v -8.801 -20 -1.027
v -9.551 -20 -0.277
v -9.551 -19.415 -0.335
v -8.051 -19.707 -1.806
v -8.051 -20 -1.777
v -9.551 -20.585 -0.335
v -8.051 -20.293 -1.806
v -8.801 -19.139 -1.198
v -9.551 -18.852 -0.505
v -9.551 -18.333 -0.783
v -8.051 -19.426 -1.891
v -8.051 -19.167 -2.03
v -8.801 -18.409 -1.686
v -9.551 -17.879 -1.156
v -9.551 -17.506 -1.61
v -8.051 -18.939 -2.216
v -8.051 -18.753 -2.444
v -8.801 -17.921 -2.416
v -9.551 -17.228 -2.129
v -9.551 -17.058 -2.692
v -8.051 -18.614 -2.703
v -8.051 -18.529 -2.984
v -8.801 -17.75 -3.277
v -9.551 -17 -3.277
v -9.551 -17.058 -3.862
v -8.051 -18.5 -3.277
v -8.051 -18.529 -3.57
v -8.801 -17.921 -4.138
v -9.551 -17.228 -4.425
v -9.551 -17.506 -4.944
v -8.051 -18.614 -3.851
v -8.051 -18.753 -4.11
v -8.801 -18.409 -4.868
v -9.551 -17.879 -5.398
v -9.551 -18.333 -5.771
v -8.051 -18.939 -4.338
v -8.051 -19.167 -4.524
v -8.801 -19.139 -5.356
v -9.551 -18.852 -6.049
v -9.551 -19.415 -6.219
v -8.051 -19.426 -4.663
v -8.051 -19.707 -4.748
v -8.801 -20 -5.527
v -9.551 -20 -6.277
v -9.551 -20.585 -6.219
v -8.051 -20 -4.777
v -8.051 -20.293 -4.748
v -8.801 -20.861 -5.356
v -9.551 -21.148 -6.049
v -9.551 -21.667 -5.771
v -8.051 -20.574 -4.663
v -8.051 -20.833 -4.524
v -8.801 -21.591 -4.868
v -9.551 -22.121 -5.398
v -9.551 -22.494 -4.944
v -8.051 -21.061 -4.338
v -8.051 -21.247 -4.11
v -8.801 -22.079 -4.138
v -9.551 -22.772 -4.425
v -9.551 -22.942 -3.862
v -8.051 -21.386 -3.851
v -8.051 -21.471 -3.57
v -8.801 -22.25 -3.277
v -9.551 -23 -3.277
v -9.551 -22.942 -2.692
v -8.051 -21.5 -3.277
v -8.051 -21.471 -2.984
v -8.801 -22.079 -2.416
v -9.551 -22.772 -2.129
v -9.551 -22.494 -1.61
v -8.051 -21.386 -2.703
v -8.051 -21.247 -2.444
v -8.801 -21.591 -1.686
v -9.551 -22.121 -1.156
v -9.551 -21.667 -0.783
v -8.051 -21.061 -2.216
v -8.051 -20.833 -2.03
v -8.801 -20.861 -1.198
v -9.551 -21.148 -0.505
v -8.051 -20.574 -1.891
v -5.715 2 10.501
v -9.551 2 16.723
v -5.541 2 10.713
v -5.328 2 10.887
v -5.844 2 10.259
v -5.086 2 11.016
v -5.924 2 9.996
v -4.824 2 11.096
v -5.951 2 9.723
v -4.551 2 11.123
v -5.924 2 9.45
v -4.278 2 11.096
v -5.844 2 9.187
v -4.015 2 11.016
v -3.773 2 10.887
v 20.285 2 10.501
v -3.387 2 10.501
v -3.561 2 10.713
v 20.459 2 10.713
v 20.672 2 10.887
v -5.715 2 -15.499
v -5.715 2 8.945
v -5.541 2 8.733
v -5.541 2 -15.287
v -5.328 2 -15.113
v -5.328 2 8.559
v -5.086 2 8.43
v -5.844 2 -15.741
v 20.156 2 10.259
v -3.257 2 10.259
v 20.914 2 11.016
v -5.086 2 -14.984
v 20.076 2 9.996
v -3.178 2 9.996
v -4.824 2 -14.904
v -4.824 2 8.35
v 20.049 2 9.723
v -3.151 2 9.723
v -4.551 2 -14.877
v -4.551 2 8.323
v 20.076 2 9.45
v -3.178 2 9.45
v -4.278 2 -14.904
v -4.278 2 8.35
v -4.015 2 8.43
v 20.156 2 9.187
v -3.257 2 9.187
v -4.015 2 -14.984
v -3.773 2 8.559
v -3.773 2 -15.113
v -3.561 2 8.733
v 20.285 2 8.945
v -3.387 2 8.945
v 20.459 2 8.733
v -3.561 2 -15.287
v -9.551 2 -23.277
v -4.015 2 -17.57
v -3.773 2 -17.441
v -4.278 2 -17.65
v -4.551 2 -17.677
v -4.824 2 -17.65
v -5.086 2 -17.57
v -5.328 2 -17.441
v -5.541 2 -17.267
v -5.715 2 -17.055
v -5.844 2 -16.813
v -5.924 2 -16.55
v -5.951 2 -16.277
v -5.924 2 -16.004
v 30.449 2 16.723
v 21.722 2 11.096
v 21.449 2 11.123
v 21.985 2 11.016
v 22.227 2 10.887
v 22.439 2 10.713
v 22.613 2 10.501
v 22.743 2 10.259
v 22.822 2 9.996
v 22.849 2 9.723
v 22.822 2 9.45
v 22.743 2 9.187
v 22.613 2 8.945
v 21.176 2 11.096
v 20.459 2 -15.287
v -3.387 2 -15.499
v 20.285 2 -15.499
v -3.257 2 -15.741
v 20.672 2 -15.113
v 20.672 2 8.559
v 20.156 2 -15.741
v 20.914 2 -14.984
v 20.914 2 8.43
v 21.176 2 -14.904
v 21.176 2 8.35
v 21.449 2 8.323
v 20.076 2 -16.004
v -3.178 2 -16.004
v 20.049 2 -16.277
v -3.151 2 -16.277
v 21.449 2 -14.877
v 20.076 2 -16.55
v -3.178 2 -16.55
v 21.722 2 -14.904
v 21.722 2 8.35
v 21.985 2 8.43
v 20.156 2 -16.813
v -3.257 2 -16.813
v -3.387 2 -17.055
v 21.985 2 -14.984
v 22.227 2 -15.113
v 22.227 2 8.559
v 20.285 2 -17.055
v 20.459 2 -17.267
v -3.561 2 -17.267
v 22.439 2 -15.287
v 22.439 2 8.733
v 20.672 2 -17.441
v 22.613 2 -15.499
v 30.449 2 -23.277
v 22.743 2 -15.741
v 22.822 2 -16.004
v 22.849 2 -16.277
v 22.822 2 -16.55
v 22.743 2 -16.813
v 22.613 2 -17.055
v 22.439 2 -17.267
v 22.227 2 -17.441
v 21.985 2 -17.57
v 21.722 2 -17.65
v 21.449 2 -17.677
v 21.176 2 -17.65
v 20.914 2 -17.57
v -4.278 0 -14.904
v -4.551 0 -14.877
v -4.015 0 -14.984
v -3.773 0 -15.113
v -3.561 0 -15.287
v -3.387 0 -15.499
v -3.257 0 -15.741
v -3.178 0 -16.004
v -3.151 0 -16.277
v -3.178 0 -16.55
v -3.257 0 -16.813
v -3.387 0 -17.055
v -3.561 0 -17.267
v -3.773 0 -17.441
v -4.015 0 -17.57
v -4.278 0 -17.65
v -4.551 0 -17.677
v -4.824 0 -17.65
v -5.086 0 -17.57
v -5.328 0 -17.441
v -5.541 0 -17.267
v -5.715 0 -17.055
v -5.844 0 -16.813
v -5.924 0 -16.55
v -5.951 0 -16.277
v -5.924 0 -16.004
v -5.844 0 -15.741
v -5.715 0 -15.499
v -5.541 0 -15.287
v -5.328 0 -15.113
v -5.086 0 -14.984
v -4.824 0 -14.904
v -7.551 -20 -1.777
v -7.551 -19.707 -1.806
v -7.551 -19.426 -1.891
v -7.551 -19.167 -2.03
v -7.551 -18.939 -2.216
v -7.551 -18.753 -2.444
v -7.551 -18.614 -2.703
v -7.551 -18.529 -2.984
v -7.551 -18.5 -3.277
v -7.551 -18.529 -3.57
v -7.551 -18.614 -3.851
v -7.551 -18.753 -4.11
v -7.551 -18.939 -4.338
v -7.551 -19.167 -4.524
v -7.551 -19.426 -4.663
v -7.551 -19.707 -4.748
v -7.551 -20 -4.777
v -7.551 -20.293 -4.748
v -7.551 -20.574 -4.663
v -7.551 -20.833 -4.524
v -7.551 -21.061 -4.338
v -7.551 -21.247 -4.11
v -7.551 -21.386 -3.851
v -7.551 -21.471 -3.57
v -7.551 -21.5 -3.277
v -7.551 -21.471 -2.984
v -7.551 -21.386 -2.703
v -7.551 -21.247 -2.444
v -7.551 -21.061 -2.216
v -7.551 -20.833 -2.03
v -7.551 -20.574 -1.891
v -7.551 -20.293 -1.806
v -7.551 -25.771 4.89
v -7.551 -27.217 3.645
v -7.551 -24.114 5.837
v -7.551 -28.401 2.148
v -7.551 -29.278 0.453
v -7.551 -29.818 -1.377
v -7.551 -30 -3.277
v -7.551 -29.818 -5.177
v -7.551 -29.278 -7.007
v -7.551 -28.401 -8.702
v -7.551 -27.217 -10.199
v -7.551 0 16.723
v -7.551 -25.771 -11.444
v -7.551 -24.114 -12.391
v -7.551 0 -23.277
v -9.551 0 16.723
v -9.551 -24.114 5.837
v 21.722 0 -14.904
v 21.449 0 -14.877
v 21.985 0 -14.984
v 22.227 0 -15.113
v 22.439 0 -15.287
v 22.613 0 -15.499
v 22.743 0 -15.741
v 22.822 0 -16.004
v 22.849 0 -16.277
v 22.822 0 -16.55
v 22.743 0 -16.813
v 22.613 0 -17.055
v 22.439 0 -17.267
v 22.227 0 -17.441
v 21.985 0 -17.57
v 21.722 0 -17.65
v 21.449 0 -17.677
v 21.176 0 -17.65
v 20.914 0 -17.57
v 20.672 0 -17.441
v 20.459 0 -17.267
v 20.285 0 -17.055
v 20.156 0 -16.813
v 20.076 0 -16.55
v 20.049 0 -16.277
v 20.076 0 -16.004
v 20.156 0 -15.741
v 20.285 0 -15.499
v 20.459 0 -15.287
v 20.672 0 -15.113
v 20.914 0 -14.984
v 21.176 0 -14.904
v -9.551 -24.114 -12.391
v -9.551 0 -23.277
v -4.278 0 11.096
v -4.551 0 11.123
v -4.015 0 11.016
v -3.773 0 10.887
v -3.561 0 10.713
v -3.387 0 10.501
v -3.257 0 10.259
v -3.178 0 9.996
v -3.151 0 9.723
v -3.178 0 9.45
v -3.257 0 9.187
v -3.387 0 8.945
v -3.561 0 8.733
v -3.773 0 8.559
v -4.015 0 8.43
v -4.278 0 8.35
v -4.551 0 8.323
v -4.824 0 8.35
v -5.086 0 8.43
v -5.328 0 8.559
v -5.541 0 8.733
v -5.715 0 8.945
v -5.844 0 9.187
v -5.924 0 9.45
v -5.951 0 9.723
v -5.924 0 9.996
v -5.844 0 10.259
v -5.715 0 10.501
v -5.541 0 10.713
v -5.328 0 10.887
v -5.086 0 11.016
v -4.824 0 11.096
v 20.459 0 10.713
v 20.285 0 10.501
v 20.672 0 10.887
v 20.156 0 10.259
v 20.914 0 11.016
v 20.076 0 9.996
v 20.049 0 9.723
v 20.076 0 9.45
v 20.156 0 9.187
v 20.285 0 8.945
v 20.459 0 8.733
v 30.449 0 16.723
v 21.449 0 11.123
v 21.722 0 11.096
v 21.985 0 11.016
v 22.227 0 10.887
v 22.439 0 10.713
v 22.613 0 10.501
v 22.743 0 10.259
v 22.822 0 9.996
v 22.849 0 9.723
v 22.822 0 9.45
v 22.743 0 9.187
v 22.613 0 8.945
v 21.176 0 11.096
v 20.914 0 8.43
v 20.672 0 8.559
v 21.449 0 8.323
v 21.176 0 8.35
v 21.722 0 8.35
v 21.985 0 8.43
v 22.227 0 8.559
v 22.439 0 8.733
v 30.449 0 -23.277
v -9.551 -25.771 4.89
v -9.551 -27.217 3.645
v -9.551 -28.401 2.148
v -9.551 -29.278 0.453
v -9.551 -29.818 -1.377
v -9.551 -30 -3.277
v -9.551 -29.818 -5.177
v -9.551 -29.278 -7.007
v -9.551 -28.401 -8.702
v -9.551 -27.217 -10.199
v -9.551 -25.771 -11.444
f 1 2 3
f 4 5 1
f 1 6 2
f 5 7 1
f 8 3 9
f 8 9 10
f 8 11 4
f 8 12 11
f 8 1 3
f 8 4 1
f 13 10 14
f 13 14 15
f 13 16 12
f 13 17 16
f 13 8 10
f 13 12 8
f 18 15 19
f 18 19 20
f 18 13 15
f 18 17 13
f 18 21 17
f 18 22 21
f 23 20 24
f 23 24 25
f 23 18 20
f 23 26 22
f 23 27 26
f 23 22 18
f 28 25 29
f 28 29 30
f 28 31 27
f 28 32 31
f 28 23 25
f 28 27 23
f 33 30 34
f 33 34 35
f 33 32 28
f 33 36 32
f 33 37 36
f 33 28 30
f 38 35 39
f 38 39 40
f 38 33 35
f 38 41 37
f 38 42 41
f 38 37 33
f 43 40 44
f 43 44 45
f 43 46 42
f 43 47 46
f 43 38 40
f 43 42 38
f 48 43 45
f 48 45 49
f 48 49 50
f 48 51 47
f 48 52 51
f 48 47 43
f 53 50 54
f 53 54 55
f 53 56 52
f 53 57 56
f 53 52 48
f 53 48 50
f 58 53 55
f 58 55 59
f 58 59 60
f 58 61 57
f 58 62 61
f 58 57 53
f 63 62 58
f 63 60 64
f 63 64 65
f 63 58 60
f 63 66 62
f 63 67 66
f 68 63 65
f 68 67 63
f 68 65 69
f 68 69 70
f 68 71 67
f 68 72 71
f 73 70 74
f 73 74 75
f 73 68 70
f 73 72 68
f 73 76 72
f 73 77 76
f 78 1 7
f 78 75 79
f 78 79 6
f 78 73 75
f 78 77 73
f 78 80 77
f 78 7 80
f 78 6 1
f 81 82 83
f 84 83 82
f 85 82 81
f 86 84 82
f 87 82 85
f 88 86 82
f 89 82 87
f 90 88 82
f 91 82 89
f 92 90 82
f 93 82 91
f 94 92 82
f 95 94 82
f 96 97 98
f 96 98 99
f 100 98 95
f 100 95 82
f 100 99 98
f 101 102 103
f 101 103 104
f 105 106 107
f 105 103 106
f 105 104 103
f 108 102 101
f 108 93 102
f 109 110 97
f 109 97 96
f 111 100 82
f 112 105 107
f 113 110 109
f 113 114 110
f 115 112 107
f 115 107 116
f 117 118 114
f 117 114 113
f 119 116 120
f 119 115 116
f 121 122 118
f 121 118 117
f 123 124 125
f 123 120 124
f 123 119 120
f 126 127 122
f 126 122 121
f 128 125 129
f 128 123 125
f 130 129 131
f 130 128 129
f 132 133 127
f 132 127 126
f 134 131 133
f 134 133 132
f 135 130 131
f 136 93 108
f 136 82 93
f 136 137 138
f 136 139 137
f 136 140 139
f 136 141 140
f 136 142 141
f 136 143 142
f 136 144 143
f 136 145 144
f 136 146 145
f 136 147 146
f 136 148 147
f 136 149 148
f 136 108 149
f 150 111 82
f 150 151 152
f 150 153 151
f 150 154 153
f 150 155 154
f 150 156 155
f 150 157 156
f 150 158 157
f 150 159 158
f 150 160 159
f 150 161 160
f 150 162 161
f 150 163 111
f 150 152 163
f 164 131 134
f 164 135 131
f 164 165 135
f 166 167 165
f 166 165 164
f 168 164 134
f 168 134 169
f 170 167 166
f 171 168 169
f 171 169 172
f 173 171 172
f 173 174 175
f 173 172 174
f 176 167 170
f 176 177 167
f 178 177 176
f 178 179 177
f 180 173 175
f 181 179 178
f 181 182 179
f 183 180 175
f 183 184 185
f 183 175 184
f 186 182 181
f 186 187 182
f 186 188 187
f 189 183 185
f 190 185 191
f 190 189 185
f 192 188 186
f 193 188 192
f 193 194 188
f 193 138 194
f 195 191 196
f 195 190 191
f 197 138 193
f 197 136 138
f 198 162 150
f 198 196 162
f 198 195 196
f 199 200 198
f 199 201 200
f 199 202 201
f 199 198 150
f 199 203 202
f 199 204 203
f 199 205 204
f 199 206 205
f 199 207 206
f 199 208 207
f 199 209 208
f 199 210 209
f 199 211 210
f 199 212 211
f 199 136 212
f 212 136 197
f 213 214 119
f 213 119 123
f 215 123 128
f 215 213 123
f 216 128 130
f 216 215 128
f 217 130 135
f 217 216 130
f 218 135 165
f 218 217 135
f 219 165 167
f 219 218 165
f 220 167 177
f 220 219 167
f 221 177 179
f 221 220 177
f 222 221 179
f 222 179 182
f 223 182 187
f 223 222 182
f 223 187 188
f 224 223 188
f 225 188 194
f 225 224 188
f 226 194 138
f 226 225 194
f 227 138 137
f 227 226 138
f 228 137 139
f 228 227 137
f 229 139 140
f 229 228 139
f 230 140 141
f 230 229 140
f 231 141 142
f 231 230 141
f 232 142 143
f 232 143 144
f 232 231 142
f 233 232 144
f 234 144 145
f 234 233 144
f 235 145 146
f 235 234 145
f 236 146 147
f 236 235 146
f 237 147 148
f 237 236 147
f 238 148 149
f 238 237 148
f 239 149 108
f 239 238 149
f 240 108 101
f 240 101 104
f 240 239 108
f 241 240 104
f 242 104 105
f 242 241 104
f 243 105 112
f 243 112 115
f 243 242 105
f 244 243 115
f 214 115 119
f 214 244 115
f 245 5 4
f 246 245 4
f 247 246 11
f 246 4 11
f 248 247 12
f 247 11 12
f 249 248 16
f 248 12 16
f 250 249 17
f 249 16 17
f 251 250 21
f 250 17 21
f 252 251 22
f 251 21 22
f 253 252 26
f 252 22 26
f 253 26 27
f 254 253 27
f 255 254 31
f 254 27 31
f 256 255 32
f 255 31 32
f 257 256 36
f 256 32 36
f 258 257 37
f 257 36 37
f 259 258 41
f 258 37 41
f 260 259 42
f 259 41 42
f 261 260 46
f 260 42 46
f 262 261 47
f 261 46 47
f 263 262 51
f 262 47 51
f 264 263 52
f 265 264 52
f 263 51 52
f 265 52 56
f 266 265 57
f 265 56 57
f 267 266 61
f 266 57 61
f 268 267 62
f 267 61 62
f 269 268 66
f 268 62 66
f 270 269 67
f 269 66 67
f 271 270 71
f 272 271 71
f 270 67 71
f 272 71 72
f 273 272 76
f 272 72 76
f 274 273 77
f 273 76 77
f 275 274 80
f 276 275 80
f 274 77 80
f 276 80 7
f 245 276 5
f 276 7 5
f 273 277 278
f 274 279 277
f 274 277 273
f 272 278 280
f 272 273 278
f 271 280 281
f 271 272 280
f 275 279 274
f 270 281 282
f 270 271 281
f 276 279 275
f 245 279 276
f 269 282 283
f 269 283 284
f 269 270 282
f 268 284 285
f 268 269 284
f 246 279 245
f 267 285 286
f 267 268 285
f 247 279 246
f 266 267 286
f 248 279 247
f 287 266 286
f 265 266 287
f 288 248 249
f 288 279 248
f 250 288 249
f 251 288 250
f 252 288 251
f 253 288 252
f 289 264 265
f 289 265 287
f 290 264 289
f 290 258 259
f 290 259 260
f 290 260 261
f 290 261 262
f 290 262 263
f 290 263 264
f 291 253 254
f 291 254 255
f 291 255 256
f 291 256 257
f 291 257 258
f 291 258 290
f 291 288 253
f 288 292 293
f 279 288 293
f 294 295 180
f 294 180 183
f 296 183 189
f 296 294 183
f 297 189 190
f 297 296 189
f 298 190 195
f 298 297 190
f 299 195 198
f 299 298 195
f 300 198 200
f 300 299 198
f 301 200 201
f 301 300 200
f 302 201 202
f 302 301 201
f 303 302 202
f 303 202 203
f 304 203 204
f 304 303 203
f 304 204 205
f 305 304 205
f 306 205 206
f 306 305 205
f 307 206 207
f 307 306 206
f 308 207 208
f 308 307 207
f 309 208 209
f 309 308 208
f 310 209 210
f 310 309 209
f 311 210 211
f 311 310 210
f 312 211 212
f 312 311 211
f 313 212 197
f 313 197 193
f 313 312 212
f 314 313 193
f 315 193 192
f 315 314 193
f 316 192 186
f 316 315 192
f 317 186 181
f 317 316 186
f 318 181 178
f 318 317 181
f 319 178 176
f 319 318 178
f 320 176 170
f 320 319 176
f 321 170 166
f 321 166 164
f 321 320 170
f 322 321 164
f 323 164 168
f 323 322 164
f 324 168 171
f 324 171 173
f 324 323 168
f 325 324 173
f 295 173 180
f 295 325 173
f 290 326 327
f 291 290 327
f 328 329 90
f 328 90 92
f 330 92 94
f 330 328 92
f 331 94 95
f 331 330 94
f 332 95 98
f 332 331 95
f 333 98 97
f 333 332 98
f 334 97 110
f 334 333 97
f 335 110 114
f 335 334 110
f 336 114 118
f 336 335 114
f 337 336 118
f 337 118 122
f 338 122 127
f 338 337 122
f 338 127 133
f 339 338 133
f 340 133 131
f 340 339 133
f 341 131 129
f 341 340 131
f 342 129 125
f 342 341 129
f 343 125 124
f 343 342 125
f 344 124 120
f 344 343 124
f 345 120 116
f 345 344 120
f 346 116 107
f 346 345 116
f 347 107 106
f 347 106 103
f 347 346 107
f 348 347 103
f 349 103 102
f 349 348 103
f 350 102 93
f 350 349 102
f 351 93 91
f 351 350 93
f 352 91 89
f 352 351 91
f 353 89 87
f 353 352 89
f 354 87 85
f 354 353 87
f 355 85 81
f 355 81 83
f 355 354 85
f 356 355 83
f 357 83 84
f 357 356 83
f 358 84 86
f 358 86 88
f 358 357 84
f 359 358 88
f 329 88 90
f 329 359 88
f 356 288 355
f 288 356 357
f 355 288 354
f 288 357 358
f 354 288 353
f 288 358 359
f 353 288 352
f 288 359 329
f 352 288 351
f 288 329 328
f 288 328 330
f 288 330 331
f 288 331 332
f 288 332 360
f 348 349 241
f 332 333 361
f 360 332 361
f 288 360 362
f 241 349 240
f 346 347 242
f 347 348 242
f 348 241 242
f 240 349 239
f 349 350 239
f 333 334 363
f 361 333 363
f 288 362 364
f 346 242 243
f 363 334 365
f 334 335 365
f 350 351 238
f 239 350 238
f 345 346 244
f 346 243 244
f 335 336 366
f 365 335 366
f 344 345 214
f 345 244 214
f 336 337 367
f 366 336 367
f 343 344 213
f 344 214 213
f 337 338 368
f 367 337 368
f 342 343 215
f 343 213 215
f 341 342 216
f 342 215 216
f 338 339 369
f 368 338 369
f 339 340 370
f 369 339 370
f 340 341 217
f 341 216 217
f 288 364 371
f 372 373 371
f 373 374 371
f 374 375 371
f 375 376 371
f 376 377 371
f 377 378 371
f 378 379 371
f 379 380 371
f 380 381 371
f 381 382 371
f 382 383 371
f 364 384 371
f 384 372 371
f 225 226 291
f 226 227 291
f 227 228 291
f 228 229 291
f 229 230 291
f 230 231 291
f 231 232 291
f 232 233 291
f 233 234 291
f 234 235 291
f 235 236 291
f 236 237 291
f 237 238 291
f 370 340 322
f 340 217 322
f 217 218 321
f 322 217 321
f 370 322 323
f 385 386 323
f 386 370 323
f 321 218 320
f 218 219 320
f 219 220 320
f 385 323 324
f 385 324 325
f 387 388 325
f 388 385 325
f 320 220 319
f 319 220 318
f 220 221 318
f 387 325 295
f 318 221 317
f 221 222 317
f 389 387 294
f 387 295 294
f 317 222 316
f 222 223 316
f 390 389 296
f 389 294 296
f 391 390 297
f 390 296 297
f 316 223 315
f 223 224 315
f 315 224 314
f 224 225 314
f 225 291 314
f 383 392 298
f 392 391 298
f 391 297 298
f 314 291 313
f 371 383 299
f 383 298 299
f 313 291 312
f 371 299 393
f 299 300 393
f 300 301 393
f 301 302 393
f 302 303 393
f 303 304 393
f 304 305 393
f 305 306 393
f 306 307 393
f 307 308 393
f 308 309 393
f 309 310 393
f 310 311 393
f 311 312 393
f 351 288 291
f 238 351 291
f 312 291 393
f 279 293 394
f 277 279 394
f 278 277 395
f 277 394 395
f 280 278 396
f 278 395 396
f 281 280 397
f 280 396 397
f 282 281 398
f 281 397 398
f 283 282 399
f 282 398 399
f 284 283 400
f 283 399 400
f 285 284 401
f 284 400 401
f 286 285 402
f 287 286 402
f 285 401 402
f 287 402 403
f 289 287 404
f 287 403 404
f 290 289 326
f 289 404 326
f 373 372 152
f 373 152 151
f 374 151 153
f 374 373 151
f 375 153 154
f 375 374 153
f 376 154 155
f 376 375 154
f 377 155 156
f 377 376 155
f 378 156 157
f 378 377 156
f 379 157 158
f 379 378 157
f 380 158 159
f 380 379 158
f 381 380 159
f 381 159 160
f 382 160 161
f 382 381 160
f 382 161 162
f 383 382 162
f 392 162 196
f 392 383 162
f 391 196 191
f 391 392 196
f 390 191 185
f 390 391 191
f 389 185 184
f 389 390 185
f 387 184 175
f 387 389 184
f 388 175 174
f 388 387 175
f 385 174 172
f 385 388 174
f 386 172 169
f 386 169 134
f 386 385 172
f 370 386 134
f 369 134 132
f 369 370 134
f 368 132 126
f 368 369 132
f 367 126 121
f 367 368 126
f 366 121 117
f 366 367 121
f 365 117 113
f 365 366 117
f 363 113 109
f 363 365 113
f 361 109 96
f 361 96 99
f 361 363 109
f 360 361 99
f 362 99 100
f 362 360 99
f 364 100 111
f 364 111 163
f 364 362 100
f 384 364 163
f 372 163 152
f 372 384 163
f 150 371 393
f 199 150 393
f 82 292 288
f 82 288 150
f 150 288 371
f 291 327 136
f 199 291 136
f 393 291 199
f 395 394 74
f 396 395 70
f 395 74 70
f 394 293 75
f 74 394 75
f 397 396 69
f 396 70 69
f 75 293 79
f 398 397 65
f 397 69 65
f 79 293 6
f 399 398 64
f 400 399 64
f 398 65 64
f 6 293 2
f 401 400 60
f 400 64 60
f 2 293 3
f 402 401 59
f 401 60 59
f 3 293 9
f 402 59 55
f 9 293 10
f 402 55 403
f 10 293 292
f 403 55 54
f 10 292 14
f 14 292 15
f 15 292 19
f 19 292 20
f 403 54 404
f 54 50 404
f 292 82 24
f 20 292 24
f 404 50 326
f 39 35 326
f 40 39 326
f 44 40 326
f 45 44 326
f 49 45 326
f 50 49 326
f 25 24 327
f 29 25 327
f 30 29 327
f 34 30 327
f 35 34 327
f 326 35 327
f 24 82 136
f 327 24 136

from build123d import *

# Parameters (mm, degrees)
SKETCH_1_W        = 40
SKETCH_1_H        = 40
SKETCH_1_R        = 1.4
EXTRUDE_494_DEPTH = 2
SKETCH_2_R        = 1.5
EXTRUDE_1_DEPTH   = 2
CHAMFER_1_SIZE    = 1.5


with BuildPart() as part:
    # Эскиз1 → Extrude 494 (new body)
    with BuildSketch(Plane(origin=(0, 0, 0), x_dir=(1, 0, 0), z_dir=(0, 1, 0))):
        with Locations((10.449336465, 3.276993421)):
            Rectangle(SKETCH_1_W, SKETCH_1_H)
        with Locations((-4.550663535, 16.276993421)):
            Circle(SKETCH_1_R, mode=Mode.SUBTRACT)
        with Locations((21.449336465, 16.276993421)):
            Circle(SKETCH_1_R, mode=Mode.SUBTRACT)
        with Locations((21.449336465, -9.723006579)):
            Circle(SKETCH_1_R, mode=Mode.SUBTRACT)
        with Locations((-4.550663535, -9.723006579)):
            Circle(SKETCH_1_R, mode=Mode.SUBTRACT)
    extrude(amount=EXTRUDE_494_DEPTH)

    # Эскиз2 → Боковая с 1 отверстием (add)
    with BuildSketch(Plane.ZY.offset(9.550663535)):
        with BuildLine():
            Line((-12.391371699, -24.114378278), (-23.276993421, 0))
            Line((-23.276993421, 0), (16.723006579, 0))
            Line((16.723006579, 0), (5.837384857, -24.114378278))
            ThreePointArc((5.837384857, -24.114378278), (-3.276993421, -30), (-12.391371699, -24.114378278))
        make_face()
        with Locations((-3.276993421, -20)):
            Circle(SKETCH_2_R, mode=Mode.SUBTRACT)
    extrude(amount=-EXTRUDE_1_DEPTH)

    # Фаска 1 отвертие
    chamfer_1_edges = [part.edges().sort_by_distance(p)[0] for p in [
        (-9.550663535, -20, -4.776993421),
    ]]
    chamfer(chamfer_1_edges, length=CHAMFER_1_SIZE)


solid = part.part
